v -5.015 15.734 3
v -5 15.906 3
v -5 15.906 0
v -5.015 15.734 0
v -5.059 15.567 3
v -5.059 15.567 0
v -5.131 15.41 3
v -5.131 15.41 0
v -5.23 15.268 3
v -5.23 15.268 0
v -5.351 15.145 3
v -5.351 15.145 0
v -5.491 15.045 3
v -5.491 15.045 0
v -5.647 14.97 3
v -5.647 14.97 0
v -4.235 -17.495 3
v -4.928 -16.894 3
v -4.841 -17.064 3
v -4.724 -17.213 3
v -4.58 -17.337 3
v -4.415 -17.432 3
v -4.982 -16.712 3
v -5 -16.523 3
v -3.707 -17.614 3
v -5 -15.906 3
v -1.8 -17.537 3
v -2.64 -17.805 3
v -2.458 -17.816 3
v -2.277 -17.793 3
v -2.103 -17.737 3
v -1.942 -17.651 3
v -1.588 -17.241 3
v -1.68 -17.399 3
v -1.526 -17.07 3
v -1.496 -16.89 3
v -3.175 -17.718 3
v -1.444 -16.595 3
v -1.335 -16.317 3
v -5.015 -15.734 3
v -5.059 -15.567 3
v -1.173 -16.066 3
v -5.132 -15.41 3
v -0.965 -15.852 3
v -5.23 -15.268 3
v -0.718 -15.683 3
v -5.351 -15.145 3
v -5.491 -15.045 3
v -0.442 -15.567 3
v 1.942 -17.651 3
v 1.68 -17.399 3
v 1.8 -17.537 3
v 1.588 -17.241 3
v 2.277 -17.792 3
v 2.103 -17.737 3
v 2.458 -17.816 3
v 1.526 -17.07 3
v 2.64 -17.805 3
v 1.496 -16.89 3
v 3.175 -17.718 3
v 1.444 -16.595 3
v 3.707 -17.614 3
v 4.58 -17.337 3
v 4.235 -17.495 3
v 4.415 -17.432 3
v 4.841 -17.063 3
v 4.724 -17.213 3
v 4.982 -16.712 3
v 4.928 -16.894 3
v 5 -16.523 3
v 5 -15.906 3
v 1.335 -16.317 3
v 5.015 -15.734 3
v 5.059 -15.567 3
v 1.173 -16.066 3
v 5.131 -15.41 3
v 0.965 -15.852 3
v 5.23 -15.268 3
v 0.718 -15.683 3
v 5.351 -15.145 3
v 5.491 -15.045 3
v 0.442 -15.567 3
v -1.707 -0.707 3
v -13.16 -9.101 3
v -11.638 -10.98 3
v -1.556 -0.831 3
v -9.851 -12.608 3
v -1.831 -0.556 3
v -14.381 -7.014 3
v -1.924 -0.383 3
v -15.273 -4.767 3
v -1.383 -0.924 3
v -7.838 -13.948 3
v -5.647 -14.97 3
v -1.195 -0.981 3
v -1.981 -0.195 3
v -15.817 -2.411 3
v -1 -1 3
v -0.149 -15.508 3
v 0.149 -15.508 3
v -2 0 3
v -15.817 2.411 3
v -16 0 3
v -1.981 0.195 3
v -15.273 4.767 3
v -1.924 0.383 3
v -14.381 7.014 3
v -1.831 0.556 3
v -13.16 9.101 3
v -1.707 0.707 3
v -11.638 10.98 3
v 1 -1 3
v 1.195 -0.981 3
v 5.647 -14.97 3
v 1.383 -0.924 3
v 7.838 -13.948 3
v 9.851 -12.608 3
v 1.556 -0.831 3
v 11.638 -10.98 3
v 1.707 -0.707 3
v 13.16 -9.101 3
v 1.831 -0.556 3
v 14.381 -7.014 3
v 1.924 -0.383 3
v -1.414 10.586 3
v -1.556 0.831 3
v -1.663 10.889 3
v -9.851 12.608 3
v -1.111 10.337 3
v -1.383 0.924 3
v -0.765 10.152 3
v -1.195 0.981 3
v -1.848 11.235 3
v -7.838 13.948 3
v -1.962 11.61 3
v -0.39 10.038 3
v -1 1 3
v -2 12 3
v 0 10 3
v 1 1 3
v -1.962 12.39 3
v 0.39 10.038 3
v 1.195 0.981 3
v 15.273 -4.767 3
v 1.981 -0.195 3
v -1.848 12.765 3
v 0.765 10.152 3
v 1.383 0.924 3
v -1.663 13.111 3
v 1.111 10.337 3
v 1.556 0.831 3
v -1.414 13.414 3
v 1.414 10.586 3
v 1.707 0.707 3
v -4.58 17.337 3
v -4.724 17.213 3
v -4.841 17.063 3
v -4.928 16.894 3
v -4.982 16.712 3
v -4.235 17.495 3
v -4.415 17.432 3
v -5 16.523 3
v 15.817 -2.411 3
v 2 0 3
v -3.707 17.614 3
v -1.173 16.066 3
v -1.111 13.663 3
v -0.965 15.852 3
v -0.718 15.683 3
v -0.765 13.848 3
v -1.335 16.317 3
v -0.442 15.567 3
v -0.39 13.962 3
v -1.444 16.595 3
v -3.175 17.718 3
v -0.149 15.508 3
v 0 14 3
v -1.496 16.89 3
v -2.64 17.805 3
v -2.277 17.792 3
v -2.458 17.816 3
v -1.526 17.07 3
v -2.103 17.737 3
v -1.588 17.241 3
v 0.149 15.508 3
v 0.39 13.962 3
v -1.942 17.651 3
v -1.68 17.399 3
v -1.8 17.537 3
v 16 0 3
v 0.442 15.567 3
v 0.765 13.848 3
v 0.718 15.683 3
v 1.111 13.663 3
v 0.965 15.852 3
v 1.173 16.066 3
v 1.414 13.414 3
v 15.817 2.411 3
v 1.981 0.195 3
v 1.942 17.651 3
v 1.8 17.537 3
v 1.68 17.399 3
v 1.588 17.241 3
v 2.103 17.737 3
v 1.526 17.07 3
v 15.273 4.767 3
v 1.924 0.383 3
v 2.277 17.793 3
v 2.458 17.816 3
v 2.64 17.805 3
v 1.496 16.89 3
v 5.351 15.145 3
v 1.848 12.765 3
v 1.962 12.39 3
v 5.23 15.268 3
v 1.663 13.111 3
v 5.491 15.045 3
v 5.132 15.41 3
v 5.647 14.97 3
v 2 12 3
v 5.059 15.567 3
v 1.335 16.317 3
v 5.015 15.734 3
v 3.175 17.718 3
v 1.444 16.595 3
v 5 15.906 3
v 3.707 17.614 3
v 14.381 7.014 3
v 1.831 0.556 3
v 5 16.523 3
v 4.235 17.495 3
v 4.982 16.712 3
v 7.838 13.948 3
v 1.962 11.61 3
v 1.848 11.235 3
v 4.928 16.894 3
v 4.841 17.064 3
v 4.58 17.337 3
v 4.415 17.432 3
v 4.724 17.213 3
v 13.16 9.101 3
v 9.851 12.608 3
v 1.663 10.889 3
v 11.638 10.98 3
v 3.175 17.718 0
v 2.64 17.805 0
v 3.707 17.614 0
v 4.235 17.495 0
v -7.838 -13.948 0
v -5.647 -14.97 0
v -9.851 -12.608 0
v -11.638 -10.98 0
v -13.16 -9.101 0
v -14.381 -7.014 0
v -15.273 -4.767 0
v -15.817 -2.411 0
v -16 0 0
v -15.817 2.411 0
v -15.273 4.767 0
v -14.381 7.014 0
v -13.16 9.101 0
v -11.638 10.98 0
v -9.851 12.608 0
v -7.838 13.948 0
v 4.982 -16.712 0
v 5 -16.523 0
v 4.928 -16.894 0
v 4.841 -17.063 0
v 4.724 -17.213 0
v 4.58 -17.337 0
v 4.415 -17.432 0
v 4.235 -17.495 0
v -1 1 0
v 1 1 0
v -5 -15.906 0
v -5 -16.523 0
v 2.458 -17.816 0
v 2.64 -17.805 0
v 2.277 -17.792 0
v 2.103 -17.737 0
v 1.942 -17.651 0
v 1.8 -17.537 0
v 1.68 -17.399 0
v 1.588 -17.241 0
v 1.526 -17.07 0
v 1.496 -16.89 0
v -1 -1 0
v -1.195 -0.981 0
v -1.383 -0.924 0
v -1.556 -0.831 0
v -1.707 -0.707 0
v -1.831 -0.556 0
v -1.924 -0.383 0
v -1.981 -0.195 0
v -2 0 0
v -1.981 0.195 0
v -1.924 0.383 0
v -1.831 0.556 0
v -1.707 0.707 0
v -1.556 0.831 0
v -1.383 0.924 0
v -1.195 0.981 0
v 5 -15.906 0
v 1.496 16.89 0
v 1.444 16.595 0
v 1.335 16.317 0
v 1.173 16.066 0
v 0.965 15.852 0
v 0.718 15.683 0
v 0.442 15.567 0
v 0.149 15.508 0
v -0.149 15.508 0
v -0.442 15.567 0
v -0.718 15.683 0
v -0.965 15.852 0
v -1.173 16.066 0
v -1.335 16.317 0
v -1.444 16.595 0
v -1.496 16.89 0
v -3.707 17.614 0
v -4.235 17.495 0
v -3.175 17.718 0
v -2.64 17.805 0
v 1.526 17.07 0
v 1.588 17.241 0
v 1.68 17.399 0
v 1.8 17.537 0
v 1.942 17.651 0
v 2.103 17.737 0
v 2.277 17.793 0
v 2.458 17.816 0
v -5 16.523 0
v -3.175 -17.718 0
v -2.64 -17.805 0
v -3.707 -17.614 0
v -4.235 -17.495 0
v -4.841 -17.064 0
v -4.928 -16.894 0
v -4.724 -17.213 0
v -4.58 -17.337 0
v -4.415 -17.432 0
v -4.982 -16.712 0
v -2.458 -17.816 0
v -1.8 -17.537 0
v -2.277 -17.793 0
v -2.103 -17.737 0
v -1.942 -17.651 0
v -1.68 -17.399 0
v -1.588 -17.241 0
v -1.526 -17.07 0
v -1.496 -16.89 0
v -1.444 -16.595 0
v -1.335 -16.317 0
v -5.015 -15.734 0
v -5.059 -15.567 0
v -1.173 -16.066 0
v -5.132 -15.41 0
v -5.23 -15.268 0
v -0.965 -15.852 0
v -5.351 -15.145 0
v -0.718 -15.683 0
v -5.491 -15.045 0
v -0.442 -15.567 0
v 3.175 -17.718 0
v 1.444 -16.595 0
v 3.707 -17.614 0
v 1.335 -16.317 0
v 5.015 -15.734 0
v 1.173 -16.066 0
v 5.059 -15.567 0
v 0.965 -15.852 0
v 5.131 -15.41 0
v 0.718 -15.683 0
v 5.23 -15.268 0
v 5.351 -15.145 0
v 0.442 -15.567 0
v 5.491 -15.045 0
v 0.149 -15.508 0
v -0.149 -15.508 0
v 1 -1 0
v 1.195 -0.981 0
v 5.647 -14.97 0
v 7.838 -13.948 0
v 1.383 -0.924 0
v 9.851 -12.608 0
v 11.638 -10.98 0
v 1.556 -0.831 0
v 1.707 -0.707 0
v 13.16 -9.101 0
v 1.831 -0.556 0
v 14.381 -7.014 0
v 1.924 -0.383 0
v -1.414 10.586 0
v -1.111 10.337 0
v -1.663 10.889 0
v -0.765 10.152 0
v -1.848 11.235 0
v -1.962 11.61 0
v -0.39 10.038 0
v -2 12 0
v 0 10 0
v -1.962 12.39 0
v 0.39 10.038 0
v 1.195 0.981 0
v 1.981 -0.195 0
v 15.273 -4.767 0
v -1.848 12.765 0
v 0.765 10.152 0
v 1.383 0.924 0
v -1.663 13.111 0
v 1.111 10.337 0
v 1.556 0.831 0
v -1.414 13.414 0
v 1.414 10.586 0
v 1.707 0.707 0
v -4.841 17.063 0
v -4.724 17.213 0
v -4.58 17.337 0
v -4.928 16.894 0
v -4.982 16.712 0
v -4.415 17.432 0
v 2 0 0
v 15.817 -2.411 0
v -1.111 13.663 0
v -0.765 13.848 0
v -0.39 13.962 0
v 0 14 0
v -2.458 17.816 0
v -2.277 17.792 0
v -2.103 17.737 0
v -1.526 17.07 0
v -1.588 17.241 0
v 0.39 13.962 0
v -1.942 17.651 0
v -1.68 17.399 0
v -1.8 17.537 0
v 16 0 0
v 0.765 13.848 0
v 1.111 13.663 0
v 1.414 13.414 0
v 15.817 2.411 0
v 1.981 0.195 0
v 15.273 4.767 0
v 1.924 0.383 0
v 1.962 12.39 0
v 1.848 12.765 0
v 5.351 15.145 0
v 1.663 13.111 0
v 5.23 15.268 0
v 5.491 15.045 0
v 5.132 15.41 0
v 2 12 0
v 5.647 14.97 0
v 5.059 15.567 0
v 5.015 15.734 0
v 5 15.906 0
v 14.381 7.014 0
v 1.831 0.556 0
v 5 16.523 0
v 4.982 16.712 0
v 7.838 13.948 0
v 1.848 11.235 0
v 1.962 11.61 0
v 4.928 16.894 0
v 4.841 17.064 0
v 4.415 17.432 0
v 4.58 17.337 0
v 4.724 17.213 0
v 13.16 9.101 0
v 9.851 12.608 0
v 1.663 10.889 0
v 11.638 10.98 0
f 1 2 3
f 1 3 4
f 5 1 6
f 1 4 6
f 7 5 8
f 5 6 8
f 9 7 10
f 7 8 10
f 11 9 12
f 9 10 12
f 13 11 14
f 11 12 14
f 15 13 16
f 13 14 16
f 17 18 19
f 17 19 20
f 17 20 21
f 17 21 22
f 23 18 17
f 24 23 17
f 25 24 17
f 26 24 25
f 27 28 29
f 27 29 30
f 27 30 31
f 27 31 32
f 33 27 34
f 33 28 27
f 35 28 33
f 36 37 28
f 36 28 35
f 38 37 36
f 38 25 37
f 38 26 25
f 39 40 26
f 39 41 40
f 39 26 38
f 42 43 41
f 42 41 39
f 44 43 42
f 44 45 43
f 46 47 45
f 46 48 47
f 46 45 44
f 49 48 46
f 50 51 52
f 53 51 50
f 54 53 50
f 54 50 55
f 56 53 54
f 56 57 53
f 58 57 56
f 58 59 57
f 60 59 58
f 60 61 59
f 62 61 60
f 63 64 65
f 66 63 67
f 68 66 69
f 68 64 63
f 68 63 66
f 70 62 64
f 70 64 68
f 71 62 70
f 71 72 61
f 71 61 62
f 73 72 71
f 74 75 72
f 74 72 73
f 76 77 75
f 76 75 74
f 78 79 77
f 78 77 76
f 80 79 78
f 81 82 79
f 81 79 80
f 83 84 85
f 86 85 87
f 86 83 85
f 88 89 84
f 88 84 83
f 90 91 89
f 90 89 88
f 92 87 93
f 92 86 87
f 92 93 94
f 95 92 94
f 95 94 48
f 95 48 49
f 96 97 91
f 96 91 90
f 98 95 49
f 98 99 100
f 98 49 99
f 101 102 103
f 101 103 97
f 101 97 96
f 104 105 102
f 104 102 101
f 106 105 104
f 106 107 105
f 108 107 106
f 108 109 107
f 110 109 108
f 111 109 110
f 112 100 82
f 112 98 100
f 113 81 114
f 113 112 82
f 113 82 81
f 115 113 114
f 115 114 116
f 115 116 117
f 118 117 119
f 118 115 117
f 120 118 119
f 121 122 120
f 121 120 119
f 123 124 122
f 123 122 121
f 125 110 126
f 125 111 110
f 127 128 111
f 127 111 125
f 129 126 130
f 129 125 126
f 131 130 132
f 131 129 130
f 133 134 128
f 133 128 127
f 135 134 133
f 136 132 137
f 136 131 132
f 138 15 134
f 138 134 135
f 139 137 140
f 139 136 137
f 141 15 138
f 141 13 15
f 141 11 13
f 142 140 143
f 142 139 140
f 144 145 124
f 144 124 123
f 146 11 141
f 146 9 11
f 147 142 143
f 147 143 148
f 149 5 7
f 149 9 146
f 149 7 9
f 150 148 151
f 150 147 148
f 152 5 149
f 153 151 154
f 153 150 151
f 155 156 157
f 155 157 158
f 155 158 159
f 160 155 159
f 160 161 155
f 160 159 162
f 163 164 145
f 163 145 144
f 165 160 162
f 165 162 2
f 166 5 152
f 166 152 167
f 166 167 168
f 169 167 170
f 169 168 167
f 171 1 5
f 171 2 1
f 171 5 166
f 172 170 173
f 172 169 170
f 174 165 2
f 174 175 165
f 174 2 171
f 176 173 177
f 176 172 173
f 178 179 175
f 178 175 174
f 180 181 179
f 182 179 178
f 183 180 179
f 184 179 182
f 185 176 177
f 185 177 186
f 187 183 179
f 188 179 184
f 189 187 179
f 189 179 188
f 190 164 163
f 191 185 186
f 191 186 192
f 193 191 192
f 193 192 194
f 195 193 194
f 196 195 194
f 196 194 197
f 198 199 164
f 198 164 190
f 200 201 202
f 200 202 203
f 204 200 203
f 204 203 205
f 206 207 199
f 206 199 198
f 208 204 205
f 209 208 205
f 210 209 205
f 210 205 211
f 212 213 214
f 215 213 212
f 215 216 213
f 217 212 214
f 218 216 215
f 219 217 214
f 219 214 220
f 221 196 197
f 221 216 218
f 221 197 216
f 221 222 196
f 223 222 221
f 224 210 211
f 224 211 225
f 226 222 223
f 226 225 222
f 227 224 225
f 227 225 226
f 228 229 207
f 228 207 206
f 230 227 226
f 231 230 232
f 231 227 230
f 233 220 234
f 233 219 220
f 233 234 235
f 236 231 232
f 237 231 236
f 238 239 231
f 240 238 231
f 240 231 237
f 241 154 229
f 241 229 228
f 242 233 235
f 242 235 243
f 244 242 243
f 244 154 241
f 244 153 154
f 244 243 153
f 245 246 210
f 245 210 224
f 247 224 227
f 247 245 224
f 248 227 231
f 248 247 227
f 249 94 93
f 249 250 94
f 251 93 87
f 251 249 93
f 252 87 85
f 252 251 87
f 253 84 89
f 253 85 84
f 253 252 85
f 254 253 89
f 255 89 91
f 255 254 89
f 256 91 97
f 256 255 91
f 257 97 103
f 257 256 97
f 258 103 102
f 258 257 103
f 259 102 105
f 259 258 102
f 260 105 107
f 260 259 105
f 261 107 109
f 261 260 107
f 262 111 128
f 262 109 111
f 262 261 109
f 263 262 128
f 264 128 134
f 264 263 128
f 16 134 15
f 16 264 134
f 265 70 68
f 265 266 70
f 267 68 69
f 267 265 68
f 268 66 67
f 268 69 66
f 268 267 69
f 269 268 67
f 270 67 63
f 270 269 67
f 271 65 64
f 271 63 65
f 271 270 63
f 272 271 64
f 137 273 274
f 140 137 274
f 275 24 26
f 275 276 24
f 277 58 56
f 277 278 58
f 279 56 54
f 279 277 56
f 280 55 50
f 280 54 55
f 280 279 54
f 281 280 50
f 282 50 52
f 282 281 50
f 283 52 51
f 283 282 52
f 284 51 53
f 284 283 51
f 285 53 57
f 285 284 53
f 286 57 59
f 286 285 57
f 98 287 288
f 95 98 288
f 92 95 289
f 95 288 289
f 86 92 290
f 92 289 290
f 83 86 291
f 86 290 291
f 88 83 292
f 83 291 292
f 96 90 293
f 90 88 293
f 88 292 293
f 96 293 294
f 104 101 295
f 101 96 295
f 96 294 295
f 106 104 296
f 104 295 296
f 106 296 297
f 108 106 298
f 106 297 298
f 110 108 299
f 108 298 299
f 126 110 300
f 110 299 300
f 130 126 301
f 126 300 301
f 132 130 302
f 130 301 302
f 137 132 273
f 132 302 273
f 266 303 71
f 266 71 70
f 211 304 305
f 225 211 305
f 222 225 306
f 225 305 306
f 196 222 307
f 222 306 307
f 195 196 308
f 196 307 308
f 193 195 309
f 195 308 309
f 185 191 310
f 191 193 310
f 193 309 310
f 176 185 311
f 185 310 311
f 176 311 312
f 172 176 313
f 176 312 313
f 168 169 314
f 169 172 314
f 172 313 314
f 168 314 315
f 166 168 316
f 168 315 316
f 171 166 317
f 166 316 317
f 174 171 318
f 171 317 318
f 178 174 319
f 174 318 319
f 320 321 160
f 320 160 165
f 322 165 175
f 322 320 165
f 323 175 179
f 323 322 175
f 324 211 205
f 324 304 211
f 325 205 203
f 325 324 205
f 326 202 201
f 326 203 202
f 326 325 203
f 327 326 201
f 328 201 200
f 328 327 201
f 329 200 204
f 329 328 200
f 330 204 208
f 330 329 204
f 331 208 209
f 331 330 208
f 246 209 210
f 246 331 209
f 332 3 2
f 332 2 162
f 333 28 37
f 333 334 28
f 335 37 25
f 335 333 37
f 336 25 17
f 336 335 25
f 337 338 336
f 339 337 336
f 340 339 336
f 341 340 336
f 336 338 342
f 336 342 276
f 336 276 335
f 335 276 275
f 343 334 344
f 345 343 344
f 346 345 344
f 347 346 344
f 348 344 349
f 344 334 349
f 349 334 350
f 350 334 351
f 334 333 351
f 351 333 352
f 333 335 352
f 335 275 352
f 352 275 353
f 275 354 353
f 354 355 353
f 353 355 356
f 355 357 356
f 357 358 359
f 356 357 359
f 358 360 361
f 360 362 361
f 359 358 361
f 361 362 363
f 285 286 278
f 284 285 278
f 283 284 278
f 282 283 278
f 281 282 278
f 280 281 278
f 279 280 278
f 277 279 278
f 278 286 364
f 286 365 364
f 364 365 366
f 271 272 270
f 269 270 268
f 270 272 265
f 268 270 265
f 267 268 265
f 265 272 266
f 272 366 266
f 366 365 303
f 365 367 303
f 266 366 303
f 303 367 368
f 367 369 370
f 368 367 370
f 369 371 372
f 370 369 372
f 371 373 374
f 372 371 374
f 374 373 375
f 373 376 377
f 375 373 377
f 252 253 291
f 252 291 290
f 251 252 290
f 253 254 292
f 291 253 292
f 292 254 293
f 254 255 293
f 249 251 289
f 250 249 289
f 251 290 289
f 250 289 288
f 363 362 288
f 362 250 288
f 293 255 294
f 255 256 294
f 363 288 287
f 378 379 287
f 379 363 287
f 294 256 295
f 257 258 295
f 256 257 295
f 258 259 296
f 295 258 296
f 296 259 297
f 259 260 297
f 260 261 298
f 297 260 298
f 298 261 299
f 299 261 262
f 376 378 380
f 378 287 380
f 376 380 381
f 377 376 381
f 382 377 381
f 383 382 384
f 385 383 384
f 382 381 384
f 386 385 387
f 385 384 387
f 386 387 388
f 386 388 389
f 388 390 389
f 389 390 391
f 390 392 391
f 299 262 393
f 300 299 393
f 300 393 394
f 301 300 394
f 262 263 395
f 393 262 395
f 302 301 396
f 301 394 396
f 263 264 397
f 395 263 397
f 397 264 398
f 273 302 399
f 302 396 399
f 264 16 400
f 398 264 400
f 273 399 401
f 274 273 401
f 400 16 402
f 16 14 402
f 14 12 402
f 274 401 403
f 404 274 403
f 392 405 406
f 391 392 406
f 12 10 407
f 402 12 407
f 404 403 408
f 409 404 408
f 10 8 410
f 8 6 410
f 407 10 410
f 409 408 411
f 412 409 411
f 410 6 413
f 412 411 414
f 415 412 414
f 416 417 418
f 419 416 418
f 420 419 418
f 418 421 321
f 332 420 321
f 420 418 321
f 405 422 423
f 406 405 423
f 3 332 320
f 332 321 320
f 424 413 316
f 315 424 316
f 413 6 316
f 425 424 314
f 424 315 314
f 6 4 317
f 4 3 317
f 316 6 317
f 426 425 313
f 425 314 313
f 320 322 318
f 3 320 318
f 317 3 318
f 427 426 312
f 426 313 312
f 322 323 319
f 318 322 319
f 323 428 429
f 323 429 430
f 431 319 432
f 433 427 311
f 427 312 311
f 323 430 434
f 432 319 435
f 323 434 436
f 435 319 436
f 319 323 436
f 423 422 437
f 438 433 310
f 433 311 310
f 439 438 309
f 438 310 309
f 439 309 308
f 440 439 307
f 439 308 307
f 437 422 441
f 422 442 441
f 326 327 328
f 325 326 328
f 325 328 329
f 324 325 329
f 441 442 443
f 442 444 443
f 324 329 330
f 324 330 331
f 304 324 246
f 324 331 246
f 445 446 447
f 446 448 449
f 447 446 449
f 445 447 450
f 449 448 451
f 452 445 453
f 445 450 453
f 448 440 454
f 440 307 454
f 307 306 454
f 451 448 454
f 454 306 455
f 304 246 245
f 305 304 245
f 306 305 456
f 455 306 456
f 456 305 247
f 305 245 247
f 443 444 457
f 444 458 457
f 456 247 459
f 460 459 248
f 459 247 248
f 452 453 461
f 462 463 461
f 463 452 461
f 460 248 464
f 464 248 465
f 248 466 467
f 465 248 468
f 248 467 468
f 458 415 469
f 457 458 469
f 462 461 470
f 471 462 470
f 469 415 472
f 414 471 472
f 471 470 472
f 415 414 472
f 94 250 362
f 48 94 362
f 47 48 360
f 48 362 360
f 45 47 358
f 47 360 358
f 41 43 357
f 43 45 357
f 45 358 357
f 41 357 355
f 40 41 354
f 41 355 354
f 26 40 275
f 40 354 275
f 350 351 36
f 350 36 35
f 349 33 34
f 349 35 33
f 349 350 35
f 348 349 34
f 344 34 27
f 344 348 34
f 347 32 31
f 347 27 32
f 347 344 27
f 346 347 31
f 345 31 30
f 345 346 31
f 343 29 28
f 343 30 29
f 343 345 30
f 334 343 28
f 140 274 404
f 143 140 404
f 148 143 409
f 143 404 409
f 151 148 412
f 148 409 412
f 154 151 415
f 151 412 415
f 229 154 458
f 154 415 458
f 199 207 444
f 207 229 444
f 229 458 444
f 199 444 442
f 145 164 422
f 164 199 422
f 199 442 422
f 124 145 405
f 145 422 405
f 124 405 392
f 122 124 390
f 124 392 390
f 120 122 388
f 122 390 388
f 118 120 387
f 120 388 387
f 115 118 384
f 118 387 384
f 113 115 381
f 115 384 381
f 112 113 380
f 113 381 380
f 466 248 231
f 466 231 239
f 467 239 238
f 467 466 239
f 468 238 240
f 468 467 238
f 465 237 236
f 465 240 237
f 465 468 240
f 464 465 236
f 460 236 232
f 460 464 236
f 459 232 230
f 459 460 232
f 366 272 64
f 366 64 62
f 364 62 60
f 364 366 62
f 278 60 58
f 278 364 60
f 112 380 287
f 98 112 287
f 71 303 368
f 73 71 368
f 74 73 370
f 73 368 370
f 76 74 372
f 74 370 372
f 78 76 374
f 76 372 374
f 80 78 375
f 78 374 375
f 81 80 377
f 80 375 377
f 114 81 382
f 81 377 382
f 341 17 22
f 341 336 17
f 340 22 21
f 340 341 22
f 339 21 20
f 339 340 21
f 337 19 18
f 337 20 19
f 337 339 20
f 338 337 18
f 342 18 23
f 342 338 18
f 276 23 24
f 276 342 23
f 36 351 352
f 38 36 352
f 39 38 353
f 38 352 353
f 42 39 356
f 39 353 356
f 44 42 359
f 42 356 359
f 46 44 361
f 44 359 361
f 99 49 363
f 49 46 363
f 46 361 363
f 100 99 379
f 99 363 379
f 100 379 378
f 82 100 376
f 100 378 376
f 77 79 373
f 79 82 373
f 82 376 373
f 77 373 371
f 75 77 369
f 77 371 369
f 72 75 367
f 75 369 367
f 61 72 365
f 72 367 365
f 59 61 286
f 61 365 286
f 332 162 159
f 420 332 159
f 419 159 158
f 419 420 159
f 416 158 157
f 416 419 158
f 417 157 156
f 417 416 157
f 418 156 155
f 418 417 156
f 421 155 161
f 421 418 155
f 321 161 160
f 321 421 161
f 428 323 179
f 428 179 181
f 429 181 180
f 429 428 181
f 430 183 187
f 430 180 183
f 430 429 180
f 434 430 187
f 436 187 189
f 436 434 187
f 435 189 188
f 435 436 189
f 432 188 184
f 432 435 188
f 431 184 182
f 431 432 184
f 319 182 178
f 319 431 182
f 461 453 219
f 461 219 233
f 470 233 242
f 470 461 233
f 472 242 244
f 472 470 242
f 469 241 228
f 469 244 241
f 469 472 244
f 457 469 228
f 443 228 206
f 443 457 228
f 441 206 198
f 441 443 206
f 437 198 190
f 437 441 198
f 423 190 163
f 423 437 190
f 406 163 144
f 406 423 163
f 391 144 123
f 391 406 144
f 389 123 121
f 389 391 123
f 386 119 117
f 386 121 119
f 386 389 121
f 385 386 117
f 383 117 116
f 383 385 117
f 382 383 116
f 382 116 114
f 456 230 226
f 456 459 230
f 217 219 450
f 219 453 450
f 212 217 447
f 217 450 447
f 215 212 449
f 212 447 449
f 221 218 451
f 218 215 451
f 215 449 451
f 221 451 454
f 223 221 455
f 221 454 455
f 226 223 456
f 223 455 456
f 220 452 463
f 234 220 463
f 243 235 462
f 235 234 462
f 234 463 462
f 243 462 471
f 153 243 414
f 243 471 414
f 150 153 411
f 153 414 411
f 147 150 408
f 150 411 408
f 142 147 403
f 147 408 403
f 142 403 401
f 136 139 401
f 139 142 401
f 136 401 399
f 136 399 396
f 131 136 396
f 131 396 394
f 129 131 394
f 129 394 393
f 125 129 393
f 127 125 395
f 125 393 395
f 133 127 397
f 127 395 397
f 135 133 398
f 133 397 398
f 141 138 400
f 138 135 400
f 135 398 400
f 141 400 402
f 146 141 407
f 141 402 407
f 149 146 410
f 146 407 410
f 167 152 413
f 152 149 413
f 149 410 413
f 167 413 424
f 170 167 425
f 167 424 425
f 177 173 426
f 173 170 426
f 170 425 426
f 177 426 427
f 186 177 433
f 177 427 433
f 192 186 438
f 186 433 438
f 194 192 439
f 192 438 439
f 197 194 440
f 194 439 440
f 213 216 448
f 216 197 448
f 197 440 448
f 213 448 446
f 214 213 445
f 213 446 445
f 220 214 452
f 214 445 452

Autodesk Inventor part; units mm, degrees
ref_plane "YZ Plane" through (0, 0, 0) normal (1, 0, 0) x (0, 1, 0)
ref_plane "XZ Plane" through (0, 0, 0) normal (0, 1, 0) x (-1, 0, 0)
ref_plane "XY Plane" through (0, 0, 0) normal (0, 0, 1) x (1, 0, 0)
sketch "Sketch1" plane through (0, 0, 0) normal (0, 0, 1) x (1, 0, 0)
  circle A0 centre (0, 12) radius 2
  arc A1 (-5.6471, 14.9703) -> (-5.6471, -14.9703) centre (0, 0) ccw
  arc A2 (5.6471, -14.9703) -> (5.6471, 14.9703) centre (0, 0) ccw
  line L0 (-5, -16.5227) -> (-5, -15.906)
  line L1 (-5, 15.906) -> (-5, 16.5227)
  line L2 (5, 16.5227) -> (5, 15.906)
  line L3 (5, -15.906) -> (5, -16.5227)
  arc A3 (-5.6471, 14.9703) -> (-5, 15.906) centre (-6, 15.906) ccw
  arc A4 (-4.2353, 17.4946) -> (-5, 16.5227) centre (-4, 16.5227) ccw
  arc A5 (5, 16.5227) -> (4.2353, 17.4946) centre (4, 16.5227) ccw
  arc A6 (5, 15.906) -> (5.6471, 14.9703) centre (6, 15.906) ccw
  arc A7 (5.6471, -14.9703) -> (5, -15.906) centre (6, -15.906) ccw
  arc A8 (4.2353, -17.4946) -> (5, -16.5227) centre (4, -16.5227) ccw
  arc A9 (-5, -16.5227) -> (-4.2353, -17.4946) centre (-4, -16.5227) ccw
  arc A10 (-5, -15.906) -> (-5.6471, -14.9703) centre (-6, -15.906) ccw
  arc A11 (-1.4959, 16.8897) -> (1.4959, 16.8897) centre (0, 17) ccw
  arc A12 (1.4959, -16.8897) -> (-1.4959, -16.8897) centre (0, -17) ccw
  arc A13 (4.2353, 17.4946) -> (2.6399, 17.8054) centre (0, 0) ccw
  arc A14 (-2.6399, 17.8054) -> (-4.2353, 17.4946) centre (0, 0) ccw
  arc A15 (-4.2353, -17.4946) -> (-2.6399, -17.8054) centre (0, 0) ccw
  arc A16 (2.6399, -17.8054) -> (4.2353, -17.4946) centre (0, 0) ccw
  arc A17 (-2.6399, -17.8054) -> (-1.4959, -16.8897) centre (-2.4932, -16.8162) ccw
  arc A18 (1.4959, -16.8897) -> (2.6399, -17.8054) centre (2.4932, -16.8162) ccw
  arc A19 (-1.4959, 16.8897) -> (-2.6399, 17.8054) centre (-2.4932, 16.8162) ccw
  arc A20 (2.6399, 17.8054) -> (1.4959, 16.8897) centre (2.4932, 16.8162) ccw
  arc A21 (-1, 1) -> (-1, -1) centre (-1, 0) ccw
  arc A22 (1, -1) -> (1, 1) centre (1, 0) ccw
  line L4 (-1, 1) -> (1, 1)
  line L5 (1, -1) -> (-1, -1)
  point P0 (-5, 17.2916)
  point P1 (5, -17.2916)
  point P2 (5, 17.2916)
  point P3 (-5, -17.2916)
  point P4 (5, 15.1987)
  point P5 (-5, 15.1987)
  point P6 (-5, -15.1987)
  point P7 (5, -15.1987)
  dimension "d6" = 4
  dimension "d16" = 1
  dimension "d17" = 16
  dimension "d18" = 16
  dimension "d21" = 10
  dimension "d22" = 10
  dimension "d25" = 3
  dimension "d28" = 3
  dimension "d29" = 1
  dimension "d34" = 12
  dimension "d35" = 2
  dimension "d36" = 2
extrude "Extrusion4" add sketch "Sketch1" along normal blind 3
properties part number "Outer Endcap080513" material "Polycarbonate, Clear"
